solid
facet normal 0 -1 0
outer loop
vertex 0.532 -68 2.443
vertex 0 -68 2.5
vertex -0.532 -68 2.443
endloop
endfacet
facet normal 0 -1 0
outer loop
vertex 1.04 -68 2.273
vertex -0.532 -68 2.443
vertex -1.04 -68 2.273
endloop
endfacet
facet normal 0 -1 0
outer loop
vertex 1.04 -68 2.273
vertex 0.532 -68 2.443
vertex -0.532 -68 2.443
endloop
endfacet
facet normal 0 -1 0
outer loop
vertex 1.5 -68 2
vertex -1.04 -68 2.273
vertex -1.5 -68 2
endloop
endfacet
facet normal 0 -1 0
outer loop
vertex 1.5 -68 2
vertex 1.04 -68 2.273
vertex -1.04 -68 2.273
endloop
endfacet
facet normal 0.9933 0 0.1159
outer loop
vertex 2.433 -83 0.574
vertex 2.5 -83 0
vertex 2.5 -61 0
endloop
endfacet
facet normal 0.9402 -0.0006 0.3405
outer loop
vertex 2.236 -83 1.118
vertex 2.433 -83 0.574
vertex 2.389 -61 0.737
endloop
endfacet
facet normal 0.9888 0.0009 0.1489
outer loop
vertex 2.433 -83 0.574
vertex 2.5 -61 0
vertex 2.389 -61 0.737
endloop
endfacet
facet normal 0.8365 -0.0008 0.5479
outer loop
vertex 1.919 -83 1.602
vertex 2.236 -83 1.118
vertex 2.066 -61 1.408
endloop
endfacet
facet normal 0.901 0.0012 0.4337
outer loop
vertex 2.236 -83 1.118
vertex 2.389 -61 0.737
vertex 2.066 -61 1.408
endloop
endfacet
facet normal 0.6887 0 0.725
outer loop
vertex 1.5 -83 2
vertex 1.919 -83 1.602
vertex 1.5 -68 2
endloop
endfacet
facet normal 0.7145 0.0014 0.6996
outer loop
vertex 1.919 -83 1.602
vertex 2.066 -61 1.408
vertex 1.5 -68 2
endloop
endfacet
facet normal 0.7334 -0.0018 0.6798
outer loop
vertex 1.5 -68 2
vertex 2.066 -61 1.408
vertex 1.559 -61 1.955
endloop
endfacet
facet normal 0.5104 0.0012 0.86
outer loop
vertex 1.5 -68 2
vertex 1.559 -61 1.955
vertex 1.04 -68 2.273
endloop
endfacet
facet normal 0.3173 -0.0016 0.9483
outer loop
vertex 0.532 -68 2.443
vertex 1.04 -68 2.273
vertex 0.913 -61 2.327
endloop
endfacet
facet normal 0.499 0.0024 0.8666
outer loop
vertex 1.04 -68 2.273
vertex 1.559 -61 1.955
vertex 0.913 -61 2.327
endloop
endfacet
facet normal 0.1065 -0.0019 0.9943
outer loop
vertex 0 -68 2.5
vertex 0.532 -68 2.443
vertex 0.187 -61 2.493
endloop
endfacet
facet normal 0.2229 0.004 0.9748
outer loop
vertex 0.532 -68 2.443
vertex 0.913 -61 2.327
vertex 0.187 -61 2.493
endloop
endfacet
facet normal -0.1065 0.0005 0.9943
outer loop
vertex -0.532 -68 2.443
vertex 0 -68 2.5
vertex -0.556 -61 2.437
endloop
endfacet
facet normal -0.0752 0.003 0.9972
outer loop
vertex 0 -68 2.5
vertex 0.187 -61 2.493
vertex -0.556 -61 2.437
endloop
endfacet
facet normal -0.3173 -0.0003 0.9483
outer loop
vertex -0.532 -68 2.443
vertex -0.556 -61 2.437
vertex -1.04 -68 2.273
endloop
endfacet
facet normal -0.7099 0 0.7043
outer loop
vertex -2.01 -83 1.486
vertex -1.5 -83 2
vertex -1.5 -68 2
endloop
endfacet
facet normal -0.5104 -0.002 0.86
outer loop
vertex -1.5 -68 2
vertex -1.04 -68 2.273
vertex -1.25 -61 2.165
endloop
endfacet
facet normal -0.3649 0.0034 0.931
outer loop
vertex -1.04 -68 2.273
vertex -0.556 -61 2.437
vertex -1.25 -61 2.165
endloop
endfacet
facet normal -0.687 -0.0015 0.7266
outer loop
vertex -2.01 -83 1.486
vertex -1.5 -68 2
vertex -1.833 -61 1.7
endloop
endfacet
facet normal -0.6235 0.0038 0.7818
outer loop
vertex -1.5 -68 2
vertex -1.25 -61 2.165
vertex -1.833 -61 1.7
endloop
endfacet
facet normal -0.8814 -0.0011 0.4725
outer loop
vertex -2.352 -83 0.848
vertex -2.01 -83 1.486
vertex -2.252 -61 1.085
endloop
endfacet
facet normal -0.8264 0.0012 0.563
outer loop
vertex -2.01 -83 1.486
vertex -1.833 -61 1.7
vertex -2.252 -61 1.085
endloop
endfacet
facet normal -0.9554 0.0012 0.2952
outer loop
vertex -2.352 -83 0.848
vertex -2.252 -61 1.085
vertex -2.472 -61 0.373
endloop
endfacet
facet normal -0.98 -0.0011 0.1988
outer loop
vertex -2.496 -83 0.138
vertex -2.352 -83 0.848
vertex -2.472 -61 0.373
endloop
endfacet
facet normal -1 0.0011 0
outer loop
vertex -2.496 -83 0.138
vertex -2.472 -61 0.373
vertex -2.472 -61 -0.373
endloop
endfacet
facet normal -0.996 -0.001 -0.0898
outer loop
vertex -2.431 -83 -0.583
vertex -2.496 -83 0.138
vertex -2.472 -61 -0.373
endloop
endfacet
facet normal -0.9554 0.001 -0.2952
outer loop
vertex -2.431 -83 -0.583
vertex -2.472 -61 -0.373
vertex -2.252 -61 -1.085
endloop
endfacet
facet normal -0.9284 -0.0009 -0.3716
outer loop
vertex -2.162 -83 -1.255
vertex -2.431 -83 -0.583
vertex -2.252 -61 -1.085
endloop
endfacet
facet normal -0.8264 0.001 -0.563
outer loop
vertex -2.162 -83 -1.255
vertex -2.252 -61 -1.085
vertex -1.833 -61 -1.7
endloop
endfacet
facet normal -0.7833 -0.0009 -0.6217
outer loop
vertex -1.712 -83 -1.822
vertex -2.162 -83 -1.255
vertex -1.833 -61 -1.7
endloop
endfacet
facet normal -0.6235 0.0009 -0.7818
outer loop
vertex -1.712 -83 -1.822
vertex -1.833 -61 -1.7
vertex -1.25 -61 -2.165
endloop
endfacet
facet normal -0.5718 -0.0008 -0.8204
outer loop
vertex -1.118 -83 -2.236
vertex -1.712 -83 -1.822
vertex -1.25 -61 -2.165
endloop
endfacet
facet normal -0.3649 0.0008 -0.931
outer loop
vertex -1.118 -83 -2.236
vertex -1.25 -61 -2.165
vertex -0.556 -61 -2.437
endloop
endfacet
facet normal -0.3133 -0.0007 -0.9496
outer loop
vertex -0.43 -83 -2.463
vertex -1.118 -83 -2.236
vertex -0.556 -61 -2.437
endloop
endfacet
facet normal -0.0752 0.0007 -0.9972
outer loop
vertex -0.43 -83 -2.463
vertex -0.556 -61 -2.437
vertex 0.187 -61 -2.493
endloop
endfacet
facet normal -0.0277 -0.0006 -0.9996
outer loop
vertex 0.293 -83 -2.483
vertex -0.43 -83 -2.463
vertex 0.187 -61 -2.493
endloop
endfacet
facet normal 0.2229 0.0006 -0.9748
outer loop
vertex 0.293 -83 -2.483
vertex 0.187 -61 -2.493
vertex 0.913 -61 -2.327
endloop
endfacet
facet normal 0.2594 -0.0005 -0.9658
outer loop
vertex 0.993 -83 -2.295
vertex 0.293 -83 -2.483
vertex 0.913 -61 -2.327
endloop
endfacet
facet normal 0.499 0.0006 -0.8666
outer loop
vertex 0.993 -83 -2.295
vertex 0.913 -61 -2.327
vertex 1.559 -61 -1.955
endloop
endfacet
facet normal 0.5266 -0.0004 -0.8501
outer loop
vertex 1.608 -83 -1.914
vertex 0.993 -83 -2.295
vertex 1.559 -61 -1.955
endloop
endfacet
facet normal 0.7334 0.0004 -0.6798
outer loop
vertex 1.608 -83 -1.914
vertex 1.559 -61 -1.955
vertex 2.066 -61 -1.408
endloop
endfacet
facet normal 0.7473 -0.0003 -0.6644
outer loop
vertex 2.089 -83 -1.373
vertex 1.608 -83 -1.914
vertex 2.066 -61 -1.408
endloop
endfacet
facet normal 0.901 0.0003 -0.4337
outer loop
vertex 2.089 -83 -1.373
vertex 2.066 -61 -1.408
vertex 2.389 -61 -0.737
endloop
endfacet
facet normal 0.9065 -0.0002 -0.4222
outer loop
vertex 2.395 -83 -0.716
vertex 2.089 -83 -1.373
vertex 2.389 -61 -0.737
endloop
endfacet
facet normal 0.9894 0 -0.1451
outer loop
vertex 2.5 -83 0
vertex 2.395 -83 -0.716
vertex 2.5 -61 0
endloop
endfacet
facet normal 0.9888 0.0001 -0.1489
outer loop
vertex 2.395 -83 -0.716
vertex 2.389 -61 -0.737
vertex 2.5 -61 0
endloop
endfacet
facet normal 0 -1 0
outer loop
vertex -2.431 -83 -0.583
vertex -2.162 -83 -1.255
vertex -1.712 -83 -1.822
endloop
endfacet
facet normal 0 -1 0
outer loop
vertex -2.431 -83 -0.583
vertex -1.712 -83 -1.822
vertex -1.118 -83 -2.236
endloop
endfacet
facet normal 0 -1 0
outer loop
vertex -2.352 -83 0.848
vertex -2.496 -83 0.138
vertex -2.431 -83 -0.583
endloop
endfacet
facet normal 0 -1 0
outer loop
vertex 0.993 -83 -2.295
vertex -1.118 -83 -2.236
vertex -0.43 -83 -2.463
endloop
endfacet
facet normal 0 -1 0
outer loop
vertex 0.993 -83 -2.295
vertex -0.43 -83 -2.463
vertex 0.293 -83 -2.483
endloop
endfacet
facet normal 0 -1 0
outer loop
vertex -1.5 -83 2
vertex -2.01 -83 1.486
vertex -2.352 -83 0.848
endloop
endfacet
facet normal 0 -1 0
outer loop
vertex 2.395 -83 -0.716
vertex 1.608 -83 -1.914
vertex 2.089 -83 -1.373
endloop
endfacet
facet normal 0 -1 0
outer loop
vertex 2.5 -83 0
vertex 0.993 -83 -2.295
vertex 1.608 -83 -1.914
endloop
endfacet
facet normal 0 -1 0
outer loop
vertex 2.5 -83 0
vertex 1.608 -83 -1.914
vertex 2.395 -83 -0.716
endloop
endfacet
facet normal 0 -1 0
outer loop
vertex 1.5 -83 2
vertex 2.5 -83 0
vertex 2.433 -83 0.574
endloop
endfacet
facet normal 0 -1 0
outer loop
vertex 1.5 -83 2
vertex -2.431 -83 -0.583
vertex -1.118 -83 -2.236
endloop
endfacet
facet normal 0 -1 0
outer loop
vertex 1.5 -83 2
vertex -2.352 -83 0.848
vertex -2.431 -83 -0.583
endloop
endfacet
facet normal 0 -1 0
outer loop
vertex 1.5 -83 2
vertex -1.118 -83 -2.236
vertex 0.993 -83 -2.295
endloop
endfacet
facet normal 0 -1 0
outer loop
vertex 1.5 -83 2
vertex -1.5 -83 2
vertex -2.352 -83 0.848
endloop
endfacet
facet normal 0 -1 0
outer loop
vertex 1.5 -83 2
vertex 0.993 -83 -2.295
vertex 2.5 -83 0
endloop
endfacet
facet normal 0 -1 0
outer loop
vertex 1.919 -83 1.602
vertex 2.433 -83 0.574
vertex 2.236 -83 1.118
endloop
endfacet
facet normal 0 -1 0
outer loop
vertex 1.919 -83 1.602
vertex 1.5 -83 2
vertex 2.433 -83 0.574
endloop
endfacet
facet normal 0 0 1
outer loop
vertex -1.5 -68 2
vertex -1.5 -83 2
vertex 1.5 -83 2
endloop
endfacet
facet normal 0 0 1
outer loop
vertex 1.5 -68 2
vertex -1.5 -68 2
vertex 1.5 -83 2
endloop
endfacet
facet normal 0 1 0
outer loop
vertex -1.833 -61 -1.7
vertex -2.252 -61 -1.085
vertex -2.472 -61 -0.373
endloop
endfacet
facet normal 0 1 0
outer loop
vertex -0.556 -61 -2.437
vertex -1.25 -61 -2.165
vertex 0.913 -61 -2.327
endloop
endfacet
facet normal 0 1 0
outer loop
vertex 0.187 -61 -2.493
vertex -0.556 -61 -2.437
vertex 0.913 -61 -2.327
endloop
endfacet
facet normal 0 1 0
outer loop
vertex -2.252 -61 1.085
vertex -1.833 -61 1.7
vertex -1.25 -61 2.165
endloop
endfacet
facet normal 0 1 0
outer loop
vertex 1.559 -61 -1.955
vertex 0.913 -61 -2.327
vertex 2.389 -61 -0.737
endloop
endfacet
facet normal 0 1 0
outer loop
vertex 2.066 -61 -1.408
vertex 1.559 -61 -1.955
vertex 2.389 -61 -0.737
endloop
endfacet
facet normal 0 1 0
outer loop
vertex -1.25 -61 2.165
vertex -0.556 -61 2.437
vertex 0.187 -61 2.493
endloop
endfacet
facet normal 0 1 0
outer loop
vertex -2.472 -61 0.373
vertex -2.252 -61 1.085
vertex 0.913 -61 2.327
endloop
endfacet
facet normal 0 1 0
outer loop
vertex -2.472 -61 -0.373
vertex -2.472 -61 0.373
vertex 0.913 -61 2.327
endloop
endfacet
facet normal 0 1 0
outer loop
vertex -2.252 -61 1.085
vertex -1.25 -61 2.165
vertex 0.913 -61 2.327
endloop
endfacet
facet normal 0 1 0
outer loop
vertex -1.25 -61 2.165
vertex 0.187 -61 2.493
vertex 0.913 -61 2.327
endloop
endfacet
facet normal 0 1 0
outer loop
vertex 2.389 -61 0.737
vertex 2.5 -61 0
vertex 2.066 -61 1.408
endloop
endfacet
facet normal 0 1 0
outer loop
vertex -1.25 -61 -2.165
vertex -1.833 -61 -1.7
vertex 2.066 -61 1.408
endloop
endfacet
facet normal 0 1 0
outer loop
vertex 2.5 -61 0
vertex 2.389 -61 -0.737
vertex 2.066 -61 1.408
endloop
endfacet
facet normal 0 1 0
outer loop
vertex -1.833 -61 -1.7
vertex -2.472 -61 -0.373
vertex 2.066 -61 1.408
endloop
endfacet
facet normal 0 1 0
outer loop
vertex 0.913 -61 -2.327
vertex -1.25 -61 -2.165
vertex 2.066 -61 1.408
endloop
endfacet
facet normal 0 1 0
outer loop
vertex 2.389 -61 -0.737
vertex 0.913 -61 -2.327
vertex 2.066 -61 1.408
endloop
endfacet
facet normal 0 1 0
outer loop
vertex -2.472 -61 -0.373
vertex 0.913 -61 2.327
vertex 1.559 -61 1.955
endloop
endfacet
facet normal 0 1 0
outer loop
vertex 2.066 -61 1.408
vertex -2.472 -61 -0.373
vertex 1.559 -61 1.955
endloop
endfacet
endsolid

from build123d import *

# Parameters (mm, degrees)
F0_W      = 42.3
F0_H      = 42.3
F1_DEPTH  = 59
F2_R      = 11
F3_DEPTH  = 2
F4_R      = 2.5
F5_DEPTH  = 22
F7_DEPTH  = 15
F9_DEPTH  = 4.5
F10_DEPTH = 61


with BuildPart() as f1:
    # F0 (on Front) → F1 (new body)
    with BuildSketch(Plane.XZ):
        Rectangle(F0_W, F0_H)
    extrude(amount=F1_DEPTH)

    # F2 (on face) → F3 (join)
    with BuildSketch(Plane.XZ.offset(59)):
        Circle(F2_R)
    extrude(amount=F3_DEPTH)

    # F4 (on face) → F5 (join)
    with BuildSketch(Plane.XZ.offset(61)):
        Circle(F4_R)
    extrude(amount=F5_DEPTH)

    # F6 (on face) → F7 (cut)
    with BuildSketch(Plane.XZ.offset(83)):
        with BuildLine():
            ThreePointArc((0, 2.5), (-0.790569415, 2.3717082451), (-1.5, 2))
            Line((-1.5, 2), (0, 2))
            Line((0, 2), (0, 2.5))
        make_face()
        with BuildLine():
            Line((0, 2.5), (0, 2))
            Line((0, 2), (1.5, 2))
            ThreePointArc((1.5, 2), (0.790569415, 2.3717082451), (0, 2.5))
        make_face()
    extrude(amount=-F7_DEPTH, mode=Mode.SUBTRACT)

    # F8 (on face) → F9 (cut)
    with BuildSketch(Plane.XZ.offset(59)):
        with BuildLine():
            ThreePointArc((16.75, 15.5), (15.5, 16.75), (14.25, 15.5))
            Line((14.25, 15.5), (15.5, 15.5))
            Line((15.5, 15.5), (15.5, 14.25))
            ThreePointArc((15.5, 14.25), (16.3838834765, 14.6161165235), (16.75, 15.5))
        make_face()
        with BuildLine():
            Line((15.5, 15.5), (14.25, 15.5))
            ThreePointArc((14.25, 15.5), (14.6161165235, 14.6161165235), (15.5, 14.25))
            Line((15.5, 14.25), (15.5, 15.5))
        make_face()
        with BuildLine():
            Line((-15.5, 14.25), (-15.5, 15.5))
            Line((-15.5, 15.5), (-14.25, 15.5))
            ThreePointArc((-14.25, 15.5), (-16.3838834765, 16.3838834765), (-15.5, 14.25))
        make_face()
        with BuildLine():
            Line((-14.25, 15.5), (-15.5, 15.5))
            Line((-15.5, 15.5), (-15.5, 14.25))
            ThreePointArc((-15.5, 14.25), (-14.6161165235, 14.6161165235), (-14.25, 15.5))
        make_face()
        with BuildLine():
            Line((-15.5, -15.5), (-15.5, -14.25))
            ThreePointArc((-15.5, -14.25), (-16.3838834765, -16.3838834765), (-14.25, -15.5))
            Line((-14.25, -15.5), (-15.5, -15.5))
        make_face()
        with BuildLine():
            ThreePointArc((-14.25, -15.5), (-14.6161165235, -14.6161165235), (-15.5, -14.25))
            Line((-15.5, -14.25), (-15.5, -15.5))
            Line((-15.5, -15.5), (-14.25, -15.5))
        make_face()
        with BuildLine():
            Line((15.5, -15.5), (15.5, -14.25))
            ThreePointArc((15.5, -14.25), (14.6161165235, -14.6161165235), (14.25, -15.5))
            Line((14.25, -15.5), (15.5, -15.5))
        make_face()
        with BuildLine():
            ThreePointArc((16.75, -15.5), (16.3838834765, -14.6161165235), (15.5, -14.25))
            Line((15.5, -14.25), (15.5, -15.5))
            Line((15.5, -15.5), (14.25, -15.5))
            ThreePointArc((14.25, -15.5), (15.5, -16.75), (16.75, -15.5))
        make_face()
    extrude(amount=-F9_DEPTH, mode=Mode.SUBTRACT)

    # F10 (cut): a face of the model
    f10_faces = [f1.faces().sort_by_distance(p)[0] for p in [
        (0, 0, 0),
    ]]
    extrude(f10_faces, amount=-F10_DEPTH, mode=Mode.SUBTRACT)


solid = f1.part
